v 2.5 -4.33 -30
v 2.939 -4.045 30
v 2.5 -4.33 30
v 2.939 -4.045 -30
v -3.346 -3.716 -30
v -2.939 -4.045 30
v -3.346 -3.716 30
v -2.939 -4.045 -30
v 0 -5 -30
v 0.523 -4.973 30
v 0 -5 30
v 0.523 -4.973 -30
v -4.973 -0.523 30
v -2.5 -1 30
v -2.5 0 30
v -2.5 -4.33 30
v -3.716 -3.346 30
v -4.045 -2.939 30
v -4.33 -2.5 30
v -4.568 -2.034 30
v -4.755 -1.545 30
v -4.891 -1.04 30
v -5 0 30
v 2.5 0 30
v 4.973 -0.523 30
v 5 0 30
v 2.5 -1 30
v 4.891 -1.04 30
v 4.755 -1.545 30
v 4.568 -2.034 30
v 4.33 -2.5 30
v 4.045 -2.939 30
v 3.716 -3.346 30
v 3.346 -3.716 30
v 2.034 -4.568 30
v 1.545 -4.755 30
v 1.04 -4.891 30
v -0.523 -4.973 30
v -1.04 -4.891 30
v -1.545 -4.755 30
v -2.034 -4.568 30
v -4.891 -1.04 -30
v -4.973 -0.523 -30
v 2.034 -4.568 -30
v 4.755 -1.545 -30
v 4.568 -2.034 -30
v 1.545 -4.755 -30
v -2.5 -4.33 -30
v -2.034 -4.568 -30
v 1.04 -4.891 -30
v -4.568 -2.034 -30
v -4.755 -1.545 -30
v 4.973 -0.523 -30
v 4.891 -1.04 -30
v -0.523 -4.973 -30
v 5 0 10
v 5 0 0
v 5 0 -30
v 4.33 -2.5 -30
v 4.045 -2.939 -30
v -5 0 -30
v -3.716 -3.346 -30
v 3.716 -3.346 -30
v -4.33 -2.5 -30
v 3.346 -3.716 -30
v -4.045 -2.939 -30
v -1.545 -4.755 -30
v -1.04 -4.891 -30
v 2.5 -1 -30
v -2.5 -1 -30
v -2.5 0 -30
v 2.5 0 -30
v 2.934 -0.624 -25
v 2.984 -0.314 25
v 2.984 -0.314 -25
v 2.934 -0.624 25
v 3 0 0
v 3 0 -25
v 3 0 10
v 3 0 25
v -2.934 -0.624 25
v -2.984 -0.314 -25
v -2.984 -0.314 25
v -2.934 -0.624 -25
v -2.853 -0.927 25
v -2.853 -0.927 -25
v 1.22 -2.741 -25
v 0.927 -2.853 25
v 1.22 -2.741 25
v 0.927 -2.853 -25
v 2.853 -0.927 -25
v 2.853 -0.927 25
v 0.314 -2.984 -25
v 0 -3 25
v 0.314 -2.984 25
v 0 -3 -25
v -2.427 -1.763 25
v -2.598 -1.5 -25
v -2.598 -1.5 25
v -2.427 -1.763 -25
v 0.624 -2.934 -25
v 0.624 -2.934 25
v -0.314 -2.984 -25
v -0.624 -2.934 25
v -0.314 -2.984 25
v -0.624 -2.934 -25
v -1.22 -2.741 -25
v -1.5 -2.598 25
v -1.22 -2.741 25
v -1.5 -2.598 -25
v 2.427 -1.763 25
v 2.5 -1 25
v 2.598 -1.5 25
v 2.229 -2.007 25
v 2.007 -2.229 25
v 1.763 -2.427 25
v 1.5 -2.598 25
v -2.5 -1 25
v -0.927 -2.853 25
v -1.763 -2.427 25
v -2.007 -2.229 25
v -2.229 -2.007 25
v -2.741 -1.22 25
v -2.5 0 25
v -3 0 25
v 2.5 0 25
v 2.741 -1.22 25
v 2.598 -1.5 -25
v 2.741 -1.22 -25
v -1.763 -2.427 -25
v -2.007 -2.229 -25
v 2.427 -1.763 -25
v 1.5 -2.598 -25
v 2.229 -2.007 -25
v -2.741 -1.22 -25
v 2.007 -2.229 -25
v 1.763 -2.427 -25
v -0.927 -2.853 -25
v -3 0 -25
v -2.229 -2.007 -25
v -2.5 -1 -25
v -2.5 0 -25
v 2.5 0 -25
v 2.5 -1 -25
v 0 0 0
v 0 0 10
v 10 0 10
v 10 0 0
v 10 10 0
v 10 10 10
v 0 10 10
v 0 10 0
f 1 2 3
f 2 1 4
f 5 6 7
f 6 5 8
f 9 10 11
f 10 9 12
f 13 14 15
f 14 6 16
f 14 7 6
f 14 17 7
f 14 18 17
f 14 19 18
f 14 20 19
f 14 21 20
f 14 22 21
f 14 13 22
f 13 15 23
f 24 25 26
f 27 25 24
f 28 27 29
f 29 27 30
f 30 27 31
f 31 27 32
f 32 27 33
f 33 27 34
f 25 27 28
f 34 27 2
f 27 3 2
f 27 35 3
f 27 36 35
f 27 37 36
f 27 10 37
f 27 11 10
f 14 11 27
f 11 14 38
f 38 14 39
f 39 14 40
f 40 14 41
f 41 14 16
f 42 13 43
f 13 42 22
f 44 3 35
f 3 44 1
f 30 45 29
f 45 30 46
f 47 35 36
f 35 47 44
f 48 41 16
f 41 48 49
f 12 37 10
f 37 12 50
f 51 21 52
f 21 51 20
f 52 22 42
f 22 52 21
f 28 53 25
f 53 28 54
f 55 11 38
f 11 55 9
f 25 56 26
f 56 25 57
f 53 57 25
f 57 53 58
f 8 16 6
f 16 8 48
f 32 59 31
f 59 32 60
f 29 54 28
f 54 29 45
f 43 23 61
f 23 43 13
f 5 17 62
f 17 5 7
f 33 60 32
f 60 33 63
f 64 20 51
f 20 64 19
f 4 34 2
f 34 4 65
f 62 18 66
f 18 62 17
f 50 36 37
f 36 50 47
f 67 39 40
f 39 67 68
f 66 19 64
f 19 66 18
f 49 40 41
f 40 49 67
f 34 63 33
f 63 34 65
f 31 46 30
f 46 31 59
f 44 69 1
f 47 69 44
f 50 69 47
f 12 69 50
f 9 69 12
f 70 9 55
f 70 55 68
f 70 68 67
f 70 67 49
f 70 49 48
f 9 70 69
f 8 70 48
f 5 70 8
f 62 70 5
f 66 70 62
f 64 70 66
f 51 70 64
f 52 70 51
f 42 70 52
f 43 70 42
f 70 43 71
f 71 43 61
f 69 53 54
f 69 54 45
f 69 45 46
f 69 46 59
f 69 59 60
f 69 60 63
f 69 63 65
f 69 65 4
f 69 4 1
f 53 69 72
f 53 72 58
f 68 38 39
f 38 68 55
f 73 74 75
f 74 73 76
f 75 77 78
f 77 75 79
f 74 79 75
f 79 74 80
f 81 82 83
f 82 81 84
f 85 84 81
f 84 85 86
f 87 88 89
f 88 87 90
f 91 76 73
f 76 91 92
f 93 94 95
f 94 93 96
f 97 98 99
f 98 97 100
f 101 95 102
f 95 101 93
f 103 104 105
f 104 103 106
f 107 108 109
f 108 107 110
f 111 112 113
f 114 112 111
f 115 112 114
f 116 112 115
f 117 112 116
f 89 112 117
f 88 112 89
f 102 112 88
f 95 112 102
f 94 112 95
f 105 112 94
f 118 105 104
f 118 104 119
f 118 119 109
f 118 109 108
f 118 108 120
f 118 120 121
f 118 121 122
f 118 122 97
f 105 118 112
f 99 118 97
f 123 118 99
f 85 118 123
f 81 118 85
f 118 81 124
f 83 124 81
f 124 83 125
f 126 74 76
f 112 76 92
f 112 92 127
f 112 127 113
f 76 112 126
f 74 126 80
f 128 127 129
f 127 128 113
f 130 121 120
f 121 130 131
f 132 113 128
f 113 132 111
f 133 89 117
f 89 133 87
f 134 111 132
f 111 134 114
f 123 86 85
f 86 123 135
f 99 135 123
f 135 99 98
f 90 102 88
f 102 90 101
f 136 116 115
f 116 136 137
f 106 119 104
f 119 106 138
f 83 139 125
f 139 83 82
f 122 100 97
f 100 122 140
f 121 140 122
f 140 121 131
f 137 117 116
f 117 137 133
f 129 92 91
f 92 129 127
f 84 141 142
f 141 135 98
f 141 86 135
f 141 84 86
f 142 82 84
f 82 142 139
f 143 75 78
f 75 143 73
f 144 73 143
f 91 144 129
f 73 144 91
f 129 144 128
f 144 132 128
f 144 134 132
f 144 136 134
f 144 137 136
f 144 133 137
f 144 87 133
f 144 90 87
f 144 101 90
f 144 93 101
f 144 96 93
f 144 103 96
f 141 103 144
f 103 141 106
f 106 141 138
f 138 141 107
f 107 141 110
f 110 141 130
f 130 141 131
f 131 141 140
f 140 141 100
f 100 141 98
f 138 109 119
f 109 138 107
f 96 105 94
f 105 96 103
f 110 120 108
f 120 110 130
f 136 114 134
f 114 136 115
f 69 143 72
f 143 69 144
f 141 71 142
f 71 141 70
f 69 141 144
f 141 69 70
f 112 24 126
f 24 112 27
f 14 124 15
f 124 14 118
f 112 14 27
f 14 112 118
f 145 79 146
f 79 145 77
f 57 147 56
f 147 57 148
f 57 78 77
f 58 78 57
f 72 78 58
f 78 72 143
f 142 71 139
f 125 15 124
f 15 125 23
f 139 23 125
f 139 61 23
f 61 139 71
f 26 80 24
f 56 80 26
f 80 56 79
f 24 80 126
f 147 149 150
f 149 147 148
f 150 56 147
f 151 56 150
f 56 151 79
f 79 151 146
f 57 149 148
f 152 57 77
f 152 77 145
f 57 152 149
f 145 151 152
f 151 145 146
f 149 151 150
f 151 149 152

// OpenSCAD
$fn=60;


internalDiameter=6;
thickness=2;
diameter=internalDiameter+2*thickness;
length=60;

rectangleHeight=2;
rectangleWidth=5;
rectangleDepth=5;
internalLength=length-rectangleDepth*2;

difference(){
    cylinder(d=diameter,h=length, center=true);
    cylinder(d=diameter-2*thickness,h=internalLength, center=true);
    translate([0,0,-rectangleDepth-internalLength/2]) cube([rectangleWidth,rectangleHeight,rectangleDepth*3],center=true);
    translate([0,0,rectangleDepth+internalLength/2]) cube([rectangleWidth,rectangleHeight,rectangleDepth*3],center=true);
    translate([-100,0,-100]) cube([200,200,200]);
}

translate([]) cube([10,10,10]);
